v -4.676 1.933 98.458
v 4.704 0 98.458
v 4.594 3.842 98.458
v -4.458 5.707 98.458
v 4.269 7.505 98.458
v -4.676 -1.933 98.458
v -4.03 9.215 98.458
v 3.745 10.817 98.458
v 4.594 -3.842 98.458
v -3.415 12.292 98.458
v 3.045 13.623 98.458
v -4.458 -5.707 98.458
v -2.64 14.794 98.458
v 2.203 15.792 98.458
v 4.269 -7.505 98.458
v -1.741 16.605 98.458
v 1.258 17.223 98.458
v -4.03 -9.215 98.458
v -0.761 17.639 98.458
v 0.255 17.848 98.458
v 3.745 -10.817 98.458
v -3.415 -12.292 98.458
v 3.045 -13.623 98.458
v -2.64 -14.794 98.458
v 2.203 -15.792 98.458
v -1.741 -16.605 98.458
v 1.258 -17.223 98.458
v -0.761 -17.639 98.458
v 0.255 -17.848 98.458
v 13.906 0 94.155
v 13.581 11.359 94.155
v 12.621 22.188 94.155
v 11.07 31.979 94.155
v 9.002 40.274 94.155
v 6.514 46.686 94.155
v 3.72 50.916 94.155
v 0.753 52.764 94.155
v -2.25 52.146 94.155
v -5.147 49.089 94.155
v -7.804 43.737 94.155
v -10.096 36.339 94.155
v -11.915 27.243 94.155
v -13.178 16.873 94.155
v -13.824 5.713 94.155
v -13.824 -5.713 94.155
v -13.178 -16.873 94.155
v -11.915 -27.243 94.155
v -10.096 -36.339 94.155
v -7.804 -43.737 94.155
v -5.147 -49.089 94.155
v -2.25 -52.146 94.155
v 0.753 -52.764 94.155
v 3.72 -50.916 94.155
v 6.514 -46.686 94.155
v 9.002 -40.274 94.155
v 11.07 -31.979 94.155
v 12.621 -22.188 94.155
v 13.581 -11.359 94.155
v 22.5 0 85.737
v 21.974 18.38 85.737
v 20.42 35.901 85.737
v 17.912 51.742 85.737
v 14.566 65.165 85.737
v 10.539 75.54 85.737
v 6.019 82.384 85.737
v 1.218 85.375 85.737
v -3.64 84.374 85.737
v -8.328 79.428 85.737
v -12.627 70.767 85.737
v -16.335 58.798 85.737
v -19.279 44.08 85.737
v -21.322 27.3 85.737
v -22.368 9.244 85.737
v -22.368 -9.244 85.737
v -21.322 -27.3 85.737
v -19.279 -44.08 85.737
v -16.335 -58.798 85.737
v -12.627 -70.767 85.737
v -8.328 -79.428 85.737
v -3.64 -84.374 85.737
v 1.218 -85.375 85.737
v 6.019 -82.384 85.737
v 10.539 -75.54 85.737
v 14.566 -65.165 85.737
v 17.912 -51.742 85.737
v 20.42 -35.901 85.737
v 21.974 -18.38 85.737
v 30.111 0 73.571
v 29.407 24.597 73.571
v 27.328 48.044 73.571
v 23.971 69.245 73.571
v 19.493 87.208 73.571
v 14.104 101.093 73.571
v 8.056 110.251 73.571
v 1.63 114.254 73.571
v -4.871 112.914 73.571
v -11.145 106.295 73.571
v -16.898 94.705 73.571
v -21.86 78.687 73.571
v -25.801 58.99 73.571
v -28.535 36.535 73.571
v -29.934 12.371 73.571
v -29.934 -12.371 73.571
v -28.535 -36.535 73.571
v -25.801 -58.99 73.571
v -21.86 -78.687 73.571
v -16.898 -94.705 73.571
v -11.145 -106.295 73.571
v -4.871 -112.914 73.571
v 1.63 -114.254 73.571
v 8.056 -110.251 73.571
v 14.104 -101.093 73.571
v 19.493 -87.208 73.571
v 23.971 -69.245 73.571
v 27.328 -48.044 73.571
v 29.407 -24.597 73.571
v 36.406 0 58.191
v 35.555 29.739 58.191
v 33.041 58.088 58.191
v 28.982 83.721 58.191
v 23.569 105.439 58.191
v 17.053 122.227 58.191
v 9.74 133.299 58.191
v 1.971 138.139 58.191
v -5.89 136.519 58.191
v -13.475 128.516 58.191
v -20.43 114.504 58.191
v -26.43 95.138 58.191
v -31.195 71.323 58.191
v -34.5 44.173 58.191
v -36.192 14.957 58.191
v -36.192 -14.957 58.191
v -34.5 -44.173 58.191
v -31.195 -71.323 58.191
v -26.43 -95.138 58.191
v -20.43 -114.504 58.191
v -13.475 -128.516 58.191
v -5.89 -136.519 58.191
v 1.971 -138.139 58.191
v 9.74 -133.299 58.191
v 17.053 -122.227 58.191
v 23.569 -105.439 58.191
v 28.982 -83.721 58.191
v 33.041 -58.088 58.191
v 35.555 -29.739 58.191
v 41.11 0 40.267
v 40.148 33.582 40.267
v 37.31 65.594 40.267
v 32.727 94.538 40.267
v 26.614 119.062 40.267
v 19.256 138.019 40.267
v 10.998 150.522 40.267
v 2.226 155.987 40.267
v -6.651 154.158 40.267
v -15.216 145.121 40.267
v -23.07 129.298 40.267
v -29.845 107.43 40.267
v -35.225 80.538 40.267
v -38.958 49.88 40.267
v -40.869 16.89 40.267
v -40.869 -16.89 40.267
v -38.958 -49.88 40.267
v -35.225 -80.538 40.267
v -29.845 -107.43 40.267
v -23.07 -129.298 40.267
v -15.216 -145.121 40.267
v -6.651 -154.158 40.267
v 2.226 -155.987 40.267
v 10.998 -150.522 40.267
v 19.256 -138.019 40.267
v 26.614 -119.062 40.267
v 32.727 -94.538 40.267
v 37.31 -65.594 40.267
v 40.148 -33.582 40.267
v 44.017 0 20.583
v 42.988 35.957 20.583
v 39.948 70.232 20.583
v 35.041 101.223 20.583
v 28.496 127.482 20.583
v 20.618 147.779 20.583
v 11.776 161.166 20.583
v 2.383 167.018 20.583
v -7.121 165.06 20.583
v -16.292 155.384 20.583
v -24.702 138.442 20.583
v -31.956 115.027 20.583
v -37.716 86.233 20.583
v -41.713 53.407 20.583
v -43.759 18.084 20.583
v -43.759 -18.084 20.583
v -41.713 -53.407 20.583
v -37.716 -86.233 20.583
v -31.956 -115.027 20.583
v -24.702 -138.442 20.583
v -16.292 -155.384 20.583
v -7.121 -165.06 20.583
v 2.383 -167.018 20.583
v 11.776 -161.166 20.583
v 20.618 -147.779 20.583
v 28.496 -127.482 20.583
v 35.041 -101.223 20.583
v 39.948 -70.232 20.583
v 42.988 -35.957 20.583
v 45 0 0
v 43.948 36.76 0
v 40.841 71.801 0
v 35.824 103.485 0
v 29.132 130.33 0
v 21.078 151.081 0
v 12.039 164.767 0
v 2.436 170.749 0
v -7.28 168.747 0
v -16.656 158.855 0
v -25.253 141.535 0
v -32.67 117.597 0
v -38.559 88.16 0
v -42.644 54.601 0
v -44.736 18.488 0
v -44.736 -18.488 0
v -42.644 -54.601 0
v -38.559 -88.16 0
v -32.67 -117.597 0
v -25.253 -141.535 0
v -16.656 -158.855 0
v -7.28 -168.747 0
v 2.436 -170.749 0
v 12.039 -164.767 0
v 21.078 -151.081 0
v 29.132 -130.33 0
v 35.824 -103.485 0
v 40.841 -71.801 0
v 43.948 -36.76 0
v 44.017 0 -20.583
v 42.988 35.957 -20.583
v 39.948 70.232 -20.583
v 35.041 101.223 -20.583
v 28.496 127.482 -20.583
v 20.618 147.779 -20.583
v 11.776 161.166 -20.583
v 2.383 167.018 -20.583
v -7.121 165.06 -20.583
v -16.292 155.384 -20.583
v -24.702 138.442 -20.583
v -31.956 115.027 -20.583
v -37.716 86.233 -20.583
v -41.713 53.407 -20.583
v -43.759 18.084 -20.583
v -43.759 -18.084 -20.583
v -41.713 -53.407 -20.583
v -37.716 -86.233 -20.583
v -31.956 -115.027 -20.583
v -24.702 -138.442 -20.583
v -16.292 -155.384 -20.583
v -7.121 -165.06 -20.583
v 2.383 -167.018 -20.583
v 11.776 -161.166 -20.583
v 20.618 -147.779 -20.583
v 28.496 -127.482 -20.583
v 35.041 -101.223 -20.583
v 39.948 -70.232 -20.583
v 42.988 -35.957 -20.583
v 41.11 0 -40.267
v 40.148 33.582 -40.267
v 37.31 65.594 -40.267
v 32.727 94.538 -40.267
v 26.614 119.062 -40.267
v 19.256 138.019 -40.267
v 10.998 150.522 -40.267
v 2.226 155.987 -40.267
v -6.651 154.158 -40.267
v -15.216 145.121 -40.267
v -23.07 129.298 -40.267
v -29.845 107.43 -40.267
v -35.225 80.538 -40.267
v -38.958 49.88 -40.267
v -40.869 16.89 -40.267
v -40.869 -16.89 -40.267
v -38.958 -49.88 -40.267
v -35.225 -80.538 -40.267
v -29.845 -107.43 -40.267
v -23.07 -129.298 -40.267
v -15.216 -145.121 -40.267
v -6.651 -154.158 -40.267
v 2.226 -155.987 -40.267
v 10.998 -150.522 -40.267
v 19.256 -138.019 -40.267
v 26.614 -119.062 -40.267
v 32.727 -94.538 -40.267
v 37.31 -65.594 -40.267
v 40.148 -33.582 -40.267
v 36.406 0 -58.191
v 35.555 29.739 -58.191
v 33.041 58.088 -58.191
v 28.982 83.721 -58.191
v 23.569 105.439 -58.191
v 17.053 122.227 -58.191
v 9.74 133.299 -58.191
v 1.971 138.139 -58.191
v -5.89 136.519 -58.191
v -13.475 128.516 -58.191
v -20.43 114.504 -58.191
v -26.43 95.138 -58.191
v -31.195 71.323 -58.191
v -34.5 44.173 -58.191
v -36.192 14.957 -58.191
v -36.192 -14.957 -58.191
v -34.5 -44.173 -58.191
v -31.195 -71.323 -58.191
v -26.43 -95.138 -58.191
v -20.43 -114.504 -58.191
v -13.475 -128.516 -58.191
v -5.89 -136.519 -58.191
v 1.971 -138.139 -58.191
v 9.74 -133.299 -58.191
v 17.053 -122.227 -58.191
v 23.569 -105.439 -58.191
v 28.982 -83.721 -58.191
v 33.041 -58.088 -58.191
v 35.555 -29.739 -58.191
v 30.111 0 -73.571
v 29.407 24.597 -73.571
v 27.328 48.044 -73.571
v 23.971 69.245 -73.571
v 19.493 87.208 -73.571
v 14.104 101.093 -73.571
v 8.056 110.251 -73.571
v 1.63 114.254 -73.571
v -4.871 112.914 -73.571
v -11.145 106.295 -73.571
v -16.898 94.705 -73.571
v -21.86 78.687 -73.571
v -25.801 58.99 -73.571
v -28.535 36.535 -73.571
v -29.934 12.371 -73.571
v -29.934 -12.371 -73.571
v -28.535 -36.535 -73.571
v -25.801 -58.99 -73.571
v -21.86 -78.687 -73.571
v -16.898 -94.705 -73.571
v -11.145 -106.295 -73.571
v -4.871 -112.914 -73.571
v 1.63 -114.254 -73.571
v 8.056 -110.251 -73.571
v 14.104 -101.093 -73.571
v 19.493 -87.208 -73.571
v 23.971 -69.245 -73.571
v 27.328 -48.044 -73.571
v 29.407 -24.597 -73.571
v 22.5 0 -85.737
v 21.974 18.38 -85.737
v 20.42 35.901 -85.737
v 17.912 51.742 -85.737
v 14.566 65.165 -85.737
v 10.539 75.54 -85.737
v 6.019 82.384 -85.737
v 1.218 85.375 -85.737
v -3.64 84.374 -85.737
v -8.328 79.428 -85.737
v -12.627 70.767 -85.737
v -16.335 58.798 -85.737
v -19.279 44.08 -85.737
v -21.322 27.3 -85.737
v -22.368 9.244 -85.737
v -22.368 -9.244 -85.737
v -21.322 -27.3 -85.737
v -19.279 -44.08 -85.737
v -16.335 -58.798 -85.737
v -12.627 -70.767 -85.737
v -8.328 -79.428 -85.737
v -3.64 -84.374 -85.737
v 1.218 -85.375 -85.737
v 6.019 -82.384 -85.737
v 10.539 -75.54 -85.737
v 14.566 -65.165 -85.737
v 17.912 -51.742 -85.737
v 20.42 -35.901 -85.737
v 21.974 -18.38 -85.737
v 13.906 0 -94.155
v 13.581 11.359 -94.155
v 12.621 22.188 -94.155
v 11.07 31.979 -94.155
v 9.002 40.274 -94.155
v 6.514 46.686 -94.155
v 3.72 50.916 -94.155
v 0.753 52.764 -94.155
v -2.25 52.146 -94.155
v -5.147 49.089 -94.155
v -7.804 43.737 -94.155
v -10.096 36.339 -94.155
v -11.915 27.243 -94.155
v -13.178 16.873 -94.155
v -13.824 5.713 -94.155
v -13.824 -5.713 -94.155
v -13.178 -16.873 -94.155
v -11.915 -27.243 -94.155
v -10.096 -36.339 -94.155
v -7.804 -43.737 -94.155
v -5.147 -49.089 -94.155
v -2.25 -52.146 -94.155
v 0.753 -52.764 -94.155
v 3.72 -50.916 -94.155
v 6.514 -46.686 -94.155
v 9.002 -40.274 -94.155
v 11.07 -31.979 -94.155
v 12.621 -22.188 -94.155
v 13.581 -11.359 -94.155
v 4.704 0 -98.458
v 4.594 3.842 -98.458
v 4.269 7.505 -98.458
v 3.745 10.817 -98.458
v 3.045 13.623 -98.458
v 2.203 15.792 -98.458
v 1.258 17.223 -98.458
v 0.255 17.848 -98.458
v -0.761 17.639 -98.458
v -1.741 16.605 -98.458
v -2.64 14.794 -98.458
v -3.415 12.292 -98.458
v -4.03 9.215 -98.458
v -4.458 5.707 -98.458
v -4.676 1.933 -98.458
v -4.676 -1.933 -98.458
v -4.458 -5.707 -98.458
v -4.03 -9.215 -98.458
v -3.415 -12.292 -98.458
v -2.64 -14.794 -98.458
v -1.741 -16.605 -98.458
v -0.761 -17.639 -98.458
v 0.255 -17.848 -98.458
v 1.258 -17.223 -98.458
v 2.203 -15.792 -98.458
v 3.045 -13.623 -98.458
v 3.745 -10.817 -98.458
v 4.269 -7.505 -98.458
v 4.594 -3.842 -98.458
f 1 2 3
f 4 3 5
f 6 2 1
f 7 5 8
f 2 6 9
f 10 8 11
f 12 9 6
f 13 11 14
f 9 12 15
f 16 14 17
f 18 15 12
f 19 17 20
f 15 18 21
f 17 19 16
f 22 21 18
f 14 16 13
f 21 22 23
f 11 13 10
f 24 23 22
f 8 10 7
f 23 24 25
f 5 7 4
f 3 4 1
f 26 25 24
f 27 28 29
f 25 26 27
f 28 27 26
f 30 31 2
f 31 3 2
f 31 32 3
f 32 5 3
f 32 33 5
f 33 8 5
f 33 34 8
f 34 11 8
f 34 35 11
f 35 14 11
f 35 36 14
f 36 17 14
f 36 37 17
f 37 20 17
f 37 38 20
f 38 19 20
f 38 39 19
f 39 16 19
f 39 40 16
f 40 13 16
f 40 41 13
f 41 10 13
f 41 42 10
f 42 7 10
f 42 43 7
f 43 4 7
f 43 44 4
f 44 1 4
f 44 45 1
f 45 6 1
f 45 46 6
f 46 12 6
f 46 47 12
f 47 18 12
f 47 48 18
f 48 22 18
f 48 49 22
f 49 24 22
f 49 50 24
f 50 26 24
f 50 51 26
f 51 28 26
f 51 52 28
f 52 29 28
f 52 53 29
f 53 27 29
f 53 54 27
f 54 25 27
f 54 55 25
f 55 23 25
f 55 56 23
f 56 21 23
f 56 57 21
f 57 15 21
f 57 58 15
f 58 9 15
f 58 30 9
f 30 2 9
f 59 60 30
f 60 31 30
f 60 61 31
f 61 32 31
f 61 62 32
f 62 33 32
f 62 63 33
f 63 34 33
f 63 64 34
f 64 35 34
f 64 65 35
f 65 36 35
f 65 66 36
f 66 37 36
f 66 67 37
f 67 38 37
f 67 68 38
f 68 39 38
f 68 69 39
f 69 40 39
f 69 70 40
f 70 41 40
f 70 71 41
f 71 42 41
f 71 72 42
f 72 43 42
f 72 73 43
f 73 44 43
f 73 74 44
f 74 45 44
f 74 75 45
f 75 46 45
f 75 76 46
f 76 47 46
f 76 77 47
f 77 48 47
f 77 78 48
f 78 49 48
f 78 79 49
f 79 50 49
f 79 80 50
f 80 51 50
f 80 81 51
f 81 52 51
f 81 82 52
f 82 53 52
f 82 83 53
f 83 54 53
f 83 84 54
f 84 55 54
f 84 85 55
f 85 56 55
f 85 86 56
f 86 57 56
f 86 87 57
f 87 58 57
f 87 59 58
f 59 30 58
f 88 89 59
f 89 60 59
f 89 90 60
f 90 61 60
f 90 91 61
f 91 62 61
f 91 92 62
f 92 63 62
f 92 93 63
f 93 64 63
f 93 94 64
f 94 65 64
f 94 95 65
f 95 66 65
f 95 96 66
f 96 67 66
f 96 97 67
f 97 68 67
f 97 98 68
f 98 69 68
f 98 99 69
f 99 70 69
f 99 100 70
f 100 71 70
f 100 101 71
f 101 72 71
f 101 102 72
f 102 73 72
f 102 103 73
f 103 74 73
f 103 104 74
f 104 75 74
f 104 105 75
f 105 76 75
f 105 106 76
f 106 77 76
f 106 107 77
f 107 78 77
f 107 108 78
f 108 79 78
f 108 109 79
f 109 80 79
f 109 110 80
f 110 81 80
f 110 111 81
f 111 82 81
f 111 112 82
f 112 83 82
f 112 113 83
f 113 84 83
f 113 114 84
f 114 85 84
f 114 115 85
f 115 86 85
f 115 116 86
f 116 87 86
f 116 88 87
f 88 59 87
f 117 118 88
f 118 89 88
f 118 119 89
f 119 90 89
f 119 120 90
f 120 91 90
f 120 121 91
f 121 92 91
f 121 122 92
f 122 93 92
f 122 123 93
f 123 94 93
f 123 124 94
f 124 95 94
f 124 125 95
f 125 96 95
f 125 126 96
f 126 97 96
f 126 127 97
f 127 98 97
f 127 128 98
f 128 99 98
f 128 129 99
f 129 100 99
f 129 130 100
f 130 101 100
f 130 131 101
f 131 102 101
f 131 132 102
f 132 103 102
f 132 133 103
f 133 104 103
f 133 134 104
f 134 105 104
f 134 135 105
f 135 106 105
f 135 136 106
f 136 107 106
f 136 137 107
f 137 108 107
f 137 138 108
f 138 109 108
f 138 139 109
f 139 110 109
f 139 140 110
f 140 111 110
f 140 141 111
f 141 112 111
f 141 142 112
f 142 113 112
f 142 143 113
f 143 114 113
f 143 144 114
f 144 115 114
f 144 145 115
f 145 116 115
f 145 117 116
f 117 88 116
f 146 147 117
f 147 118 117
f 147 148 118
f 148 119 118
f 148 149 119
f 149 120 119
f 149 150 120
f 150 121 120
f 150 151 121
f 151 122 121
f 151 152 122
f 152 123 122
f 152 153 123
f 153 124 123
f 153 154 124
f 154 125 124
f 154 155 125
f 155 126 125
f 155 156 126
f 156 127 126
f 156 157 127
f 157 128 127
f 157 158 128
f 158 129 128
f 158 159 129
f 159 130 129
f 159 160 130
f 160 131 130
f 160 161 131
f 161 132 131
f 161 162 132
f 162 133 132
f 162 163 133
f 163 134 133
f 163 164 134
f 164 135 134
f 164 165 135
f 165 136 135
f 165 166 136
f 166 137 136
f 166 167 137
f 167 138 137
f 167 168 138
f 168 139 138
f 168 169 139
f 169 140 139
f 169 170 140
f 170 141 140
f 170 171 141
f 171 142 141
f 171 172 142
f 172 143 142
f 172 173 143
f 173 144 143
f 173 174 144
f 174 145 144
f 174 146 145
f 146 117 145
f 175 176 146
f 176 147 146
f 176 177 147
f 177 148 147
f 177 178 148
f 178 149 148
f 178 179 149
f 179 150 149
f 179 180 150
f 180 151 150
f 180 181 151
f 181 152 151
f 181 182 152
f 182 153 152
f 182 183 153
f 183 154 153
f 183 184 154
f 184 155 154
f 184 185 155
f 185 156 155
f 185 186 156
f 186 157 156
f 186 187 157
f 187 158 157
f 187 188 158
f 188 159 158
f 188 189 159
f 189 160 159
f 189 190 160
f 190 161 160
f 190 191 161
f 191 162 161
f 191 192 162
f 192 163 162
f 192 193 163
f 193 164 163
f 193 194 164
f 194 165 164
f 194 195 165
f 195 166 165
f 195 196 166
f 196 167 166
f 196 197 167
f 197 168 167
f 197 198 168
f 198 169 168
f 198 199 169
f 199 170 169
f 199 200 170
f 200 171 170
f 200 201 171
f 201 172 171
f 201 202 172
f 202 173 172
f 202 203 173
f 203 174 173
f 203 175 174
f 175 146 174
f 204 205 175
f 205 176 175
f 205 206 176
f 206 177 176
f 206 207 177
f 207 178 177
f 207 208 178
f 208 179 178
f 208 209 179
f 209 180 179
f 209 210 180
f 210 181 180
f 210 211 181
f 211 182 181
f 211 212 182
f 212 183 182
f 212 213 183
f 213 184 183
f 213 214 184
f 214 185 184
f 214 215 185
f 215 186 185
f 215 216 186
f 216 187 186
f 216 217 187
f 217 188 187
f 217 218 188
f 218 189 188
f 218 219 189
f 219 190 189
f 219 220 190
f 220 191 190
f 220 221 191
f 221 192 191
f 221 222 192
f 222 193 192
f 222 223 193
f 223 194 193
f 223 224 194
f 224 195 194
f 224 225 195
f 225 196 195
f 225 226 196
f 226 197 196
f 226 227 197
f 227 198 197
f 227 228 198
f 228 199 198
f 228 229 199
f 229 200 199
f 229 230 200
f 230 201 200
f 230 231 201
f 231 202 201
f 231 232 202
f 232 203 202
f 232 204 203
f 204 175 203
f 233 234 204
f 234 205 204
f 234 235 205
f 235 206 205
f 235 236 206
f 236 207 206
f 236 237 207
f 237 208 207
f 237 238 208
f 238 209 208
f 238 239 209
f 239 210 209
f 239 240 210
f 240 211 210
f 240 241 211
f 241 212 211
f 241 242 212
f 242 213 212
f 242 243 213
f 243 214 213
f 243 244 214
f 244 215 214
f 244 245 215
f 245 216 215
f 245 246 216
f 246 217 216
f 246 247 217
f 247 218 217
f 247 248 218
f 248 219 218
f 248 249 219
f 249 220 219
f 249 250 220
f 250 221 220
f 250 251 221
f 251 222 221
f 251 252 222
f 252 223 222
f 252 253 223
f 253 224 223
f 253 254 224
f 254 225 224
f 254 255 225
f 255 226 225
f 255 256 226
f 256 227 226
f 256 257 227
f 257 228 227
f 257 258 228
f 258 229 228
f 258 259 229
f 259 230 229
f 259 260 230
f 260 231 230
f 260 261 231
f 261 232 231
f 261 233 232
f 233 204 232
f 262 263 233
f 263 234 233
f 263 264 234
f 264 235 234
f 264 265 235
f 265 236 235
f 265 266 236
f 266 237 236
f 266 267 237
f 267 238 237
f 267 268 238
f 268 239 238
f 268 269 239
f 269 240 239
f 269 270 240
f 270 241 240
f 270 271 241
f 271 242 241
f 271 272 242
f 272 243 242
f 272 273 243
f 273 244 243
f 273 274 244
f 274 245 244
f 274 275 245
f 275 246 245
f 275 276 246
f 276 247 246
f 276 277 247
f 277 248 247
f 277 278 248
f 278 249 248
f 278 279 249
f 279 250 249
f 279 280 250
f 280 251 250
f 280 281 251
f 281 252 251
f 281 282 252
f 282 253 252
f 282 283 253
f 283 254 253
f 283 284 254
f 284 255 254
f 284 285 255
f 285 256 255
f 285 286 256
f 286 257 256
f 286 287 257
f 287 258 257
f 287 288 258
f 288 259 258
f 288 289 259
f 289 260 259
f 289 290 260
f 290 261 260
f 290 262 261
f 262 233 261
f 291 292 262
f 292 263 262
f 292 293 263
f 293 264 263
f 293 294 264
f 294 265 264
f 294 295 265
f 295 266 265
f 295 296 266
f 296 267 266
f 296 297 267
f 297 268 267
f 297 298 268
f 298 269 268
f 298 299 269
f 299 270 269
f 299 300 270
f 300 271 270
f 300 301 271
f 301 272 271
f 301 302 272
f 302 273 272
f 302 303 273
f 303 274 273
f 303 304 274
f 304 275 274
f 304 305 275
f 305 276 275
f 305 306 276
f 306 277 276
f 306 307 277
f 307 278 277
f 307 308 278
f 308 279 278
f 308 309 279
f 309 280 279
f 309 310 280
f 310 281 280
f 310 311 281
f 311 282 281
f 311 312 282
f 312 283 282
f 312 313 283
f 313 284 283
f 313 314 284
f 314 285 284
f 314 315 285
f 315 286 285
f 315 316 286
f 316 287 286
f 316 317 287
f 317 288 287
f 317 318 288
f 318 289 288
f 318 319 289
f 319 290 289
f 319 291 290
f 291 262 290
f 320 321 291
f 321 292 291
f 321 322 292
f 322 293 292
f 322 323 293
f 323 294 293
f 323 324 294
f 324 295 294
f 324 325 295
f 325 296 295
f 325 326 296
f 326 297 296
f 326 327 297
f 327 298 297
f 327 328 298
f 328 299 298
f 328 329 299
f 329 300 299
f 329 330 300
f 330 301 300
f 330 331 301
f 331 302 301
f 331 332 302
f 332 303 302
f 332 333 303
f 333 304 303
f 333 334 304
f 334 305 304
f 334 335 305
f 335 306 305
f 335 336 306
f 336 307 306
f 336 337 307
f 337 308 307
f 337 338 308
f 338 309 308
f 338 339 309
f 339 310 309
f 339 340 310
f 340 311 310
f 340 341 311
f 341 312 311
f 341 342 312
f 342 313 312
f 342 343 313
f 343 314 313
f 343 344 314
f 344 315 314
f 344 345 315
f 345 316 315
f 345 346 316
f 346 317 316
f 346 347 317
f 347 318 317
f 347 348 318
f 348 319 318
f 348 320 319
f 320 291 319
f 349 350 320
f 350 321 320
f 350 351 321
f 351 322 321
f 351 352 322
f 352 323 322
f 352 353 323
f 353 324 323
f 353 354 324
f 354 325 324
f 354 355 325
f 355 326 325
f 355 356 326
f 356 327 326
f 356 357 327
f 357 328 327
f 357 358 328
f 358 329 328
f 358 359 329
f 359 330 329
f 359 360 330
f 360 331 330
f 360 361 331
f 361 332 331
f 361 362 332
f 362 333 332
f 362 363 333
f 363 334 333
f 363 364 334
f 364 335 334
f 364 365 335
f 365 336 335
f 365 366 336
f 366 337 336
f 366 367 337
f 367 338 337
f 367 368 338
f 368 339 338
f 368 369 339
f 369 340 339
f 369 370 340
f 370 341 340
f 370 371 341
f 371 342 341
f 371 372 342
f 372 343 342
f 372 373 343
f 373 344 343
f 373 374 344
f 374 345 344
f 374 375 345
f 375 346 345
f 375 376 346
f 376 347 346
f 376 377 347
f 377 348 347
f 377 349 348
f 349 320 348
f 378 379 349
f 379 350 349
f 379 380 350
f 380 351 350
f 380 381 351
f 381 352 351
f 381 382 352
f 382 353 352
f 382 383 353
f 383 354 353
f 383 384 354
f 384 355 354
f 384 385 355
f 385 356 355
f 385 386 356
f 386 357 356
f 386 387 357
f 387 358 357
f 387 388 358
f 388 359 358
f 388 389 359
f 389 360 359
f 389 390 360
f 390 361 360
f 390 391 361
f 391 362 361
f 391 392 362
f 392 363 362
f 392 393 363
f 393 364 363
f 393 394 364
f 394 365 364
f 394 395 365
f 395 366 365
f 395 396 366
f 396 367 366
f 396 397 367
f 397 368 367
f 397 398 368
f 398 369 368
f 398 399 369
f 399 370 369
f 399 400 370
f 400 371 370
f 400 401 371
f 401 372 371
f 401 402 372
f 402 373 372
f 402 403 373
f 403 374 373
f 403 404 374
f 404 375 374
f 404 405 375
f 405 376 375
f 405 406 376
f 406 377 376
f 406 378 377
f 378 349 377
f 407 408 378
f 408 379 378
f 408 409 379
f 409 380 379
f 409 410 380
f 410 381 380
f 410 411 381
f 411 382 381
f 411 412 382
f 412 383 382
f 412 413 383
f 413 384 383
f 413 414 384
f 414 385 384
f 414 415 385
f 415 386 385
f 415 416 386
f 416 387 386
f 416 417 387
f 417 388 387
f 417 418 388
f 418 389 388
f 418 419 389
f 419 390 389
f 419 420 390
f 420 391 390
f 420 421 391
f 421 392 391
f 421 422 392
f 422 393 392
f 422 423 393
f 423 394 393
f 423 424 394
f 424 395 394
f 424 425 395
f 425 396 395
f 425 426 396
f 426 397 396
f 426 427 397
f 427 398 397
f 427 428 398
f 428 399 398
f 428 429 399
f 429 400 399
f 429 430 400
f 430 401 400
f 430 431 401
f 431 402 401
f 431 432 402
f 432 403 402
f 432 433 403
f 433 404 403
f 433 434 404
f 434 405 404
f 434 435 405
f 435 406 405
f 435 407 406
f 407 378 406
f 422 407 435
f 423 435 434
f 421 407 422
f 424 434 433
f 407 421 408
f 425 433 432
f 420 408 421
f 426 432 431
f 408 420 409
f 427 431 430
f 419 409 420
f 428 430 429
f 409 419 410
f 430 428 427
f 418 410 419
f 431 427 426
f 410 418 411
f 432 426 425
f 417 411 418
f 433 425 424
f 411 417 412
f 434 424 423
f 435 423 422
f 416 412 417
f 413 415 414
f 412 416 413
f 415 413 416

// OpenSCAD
// Generated by SolidPython 1.0.1 on 2020-07-29 00:46:47


scale(v = [5, 19, 11]) {
	sphere(r = 9);
}
/***********************************************
*********      SolidPython code:      **********
************************************************
 
# import packages: SolidPython
from solid import *
from solid.utils import *
from itertools import chain, combinations, permutations


class Resize:

    def __init__(self, scad_file):
        self.scad_file = scad_file
        #self.scad_file = import_scad(scad_file)
        # cone/cylinder param:
        self.r1 = 0
        self.r2 = 0
        self.h = 0
        # rectangular prism param:
        self.w = 0
        self.l = 0
        # ellipse param:
        self.r = 0

    # import OpenScad code (file name corresponds to shape)


    # classify shape + parameters
    def assign(self, param1, param2, param3):
        if self.scad_file == 'cone.scad':
            self.r1 = param1
            self.r2 = param2
            self.h = param3
        elif self.scad_file == 'cylinder.scad':
            self.r1 = param1
            self.r2 = param2
            self.h = param3
        elif self.scad_file == 'rectangularPrism.scad':
            self.h = param1
            self.l = param2
            self.w = param3
        else:
            self.r = param1
            self.h = param2

    # resize parameters
    def iterate(self):
        x = range(3, 20, 2)
        i = 1
        if self.scad_file == 'cone.scad':
            tempList = list(permutations(x, 2))
            for temp in tempList:
                param1 = temp[0]
                param2 = temp[1]
                filepath = 'produced_scad_files/' + 'cone' + str(param1) + '_' + str(param2) + '_' + '.scad'
                scad_render_to_file(cylinder(h=param1, r1=param2, r2=0), filepath)

        elif self.scad_file == 'cylinder.scad':
            tempList = list(permutations(x, 3))
            for temp in tempList:
                param1 = temp[0]
                param2 = temp[1]
                filepath = 'produced_scad_files/' + 'cylinder' + str(param1) + '_' + str(param2) + '_' + '.scad'
                scad_render_to_file(cylinder(h=param1, r1=param2, r2=param2), filepath)

        elif self.scad_file == 'rectangularPrism.scad':
            tempList = list(permutations(x, 3))
            for temp in tempList:
                param1 = temp[0]
                param2 = temp[1]
                param3 = temp[2]
                filepath = 'produced_scad_files/' + 'rectangularPrism' + str(param1) + '_' + str(param2) + '_' + str(
                    param3) + '.scad'
                scad_render_to_file(cube(size=(param1, param2, param3)), filepath)

        elif self.scad_file == 'ellipse.scad':
            tempList = list(permutations(x, 4))
            for temp in tempList:
                param1 = temp[0]
                param2 = temp[1]
                param3 = temp[2]
                param4 = temp[3]
                filepath = 'produced_scad_files/' + 'ellipse' + str(param1) + '_' + str(param2) + '_' + str(param3) + '_' + str(param4) + '.scad'
                scad_render_to_file(scale([param1, param2, param3])(sphere(r=param4)), filepath)

    def render_to_scadfile(self):
        scad_render_to_file(scad, 'example.scad') 
 
************************************************/
